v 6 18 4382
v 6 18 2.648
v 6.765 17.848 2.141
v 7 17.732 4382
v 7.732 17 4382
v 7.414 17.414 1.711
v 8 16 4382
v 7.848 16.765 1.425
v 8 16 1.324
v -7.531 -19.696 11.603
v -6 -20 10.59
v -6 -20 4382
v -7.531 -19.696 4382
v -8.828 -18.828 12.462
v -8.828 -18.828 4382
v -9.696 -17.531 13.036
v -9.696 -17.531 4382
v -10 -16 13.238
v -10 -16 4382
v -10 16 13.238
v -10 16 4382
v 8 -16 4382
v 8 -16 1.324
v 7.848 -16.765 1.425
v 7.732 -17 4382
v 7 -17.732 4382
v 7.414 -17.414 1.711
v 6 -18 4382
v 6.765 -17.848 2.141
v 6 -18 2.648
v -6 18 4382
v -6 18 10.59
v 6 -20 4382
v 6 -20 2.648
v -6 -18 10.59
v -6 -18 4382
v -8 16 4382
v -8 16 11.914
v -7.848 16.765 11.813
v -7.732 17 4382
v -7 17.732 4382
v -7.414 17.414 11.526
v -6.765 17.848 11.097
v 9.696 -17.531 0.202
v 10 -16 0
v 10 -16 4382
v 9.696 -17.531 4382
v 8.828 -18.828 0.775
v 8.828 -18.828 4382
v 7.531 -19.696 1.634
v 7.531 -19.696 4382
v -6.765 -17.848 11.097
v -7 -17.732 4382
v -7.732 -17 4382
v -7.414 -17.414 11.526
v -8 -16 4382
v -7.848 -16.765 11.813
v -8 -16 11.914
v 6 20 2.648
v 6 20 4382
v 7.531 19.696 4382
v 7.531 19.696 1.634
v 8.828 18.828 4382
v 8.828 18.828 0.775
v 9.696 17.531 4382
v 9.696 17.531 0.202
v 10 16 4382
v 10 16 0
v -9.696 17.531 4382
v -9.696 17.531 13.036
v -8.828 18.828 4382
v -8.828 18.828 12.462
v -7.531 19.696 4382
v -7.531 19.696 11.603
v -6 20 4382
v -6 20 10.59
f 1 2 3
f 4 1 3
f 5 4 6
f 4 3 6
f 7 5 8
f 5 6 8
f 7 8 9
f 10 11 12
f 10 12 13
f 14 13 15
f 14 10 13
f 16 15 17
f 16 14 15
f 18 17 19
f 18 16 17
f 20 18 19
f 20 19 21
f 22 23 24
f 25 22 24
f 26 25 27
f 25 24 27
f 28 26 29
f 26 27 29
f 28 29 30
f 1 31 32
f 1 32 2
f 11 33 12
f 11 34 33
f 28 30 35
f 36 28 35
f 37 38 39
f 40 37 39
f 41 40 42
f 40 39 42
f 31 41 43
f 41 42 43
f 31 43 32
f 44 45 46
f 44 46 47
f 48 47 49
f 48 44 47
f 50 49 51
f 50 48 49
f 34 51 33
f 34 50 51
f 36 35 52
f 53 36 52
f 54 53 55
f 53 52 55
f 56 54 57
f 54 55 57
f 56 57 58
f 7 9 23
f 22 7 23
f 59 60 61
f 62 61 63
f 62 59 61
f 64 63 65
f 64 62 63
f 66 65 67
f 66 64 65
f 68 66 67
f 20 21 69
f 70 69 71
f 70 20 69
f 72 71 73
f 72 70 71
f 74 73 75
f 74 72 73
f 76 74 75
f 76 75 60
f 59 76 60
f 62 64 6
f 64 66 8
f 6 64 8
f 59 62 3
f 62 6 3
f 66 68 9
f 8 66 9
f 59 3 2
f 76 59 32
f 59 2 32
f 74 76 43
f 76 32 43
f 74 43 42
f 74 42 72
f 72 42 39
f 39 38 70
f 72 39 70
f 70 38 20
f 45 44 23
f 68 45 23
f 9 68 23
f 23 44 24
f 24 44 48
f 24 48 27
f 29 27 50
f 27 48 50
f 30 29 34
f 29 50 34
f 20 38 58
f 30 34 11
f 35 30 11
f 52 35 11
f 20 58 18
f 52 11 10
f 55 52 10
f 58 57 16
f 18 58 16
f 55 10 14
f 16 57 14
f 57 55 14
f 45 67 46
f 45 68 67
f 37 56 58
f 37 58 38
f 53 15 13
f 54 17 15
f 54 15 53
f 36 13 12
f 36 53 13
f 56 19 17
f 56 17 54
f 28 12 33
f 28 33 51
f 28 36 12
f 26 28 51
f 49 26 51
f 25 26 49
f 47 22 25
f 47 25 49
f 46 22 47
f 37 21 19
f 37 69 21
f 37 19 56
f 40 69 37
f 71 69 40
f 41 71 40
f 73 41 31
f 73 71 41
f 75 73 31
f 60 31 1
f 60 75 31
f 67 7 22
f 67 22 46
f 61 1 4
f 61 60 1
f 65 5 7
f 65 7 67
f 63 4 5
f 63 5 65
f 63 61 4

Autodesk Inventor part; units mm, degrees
ref_plane "YZ Plane" through (0, 0, 0) normal (1, 0, 0) x (0, 1, 0)
ref_plane "Start plane" through (0, 0, 0) normal (0, 0, 1) x (1, 0, 0)
ref_plane "End plane" through (0, 0, 4382) normal (0, 0, 1) x (1, 0, 0)
sketch "Sketch" plane through (0, 0, 0) normal (0, 0, 1) x (1, 0, 0)
  line L0 (-10, -16) -> (-10, 16)
  line L1 (-6, 20) -> (6, 20)
  line L2 (10, 16) -> (10, -16)
  line L3 (6, -20) -> (-6, -20)
  arc A0 (-10, -16) -> (-6, -20) centre (-6, -16) ccw
  arc A1 (10, 16) -> (6, 20) centre (6, 16) ccw
  arc A2 (-6, 20) -> (-10, 16) centre (-6, 16) ccw
  arc A3 (6, -20) -> (10, -16) centre (6, -16) ccw
  arc A4 (-6, 18) -> (-8, 16) centre (-6, 16) ccw
  line L4 (-6, 18) -> (6, 18)
  arc A5 (8, 16) -> (6, 18) centre (6, 16) ccw
  line L5 (8, 16) -> (8, -16)
  arc A6 (6, -18) -> (8, -16) centre (6, -16) ccw
  line L6 (6, -18) -> (-6, -18)
  arc A7 (-8, -16) -> (-6, -18) centre (-6, -16) ccw
  line L7 (-8, -16) -> (-8, 16)
  line L8 (0, 29.1598) -> (0, -29.1598) construction
  line L9 (-15.1598, 0) -> (15.1598, 0) construction
  dimension "d7" = 4
  dimension "d9" = 20
  dimension "d11" = 40
  dimension "d12" = 2
  dimension "d15" = 10
  dimension "d16" = 20
extrude "Body" add sketch "Sketch" along normal up to surface (4382 mm away) from surface at 0
sketch "Sketch3" plane through (0, 0, 0) normal (0, 0, 1) x (1, 0, 0)
  line L0 (0, 0) -> (10, 0)
ref_plane "Work Plane3" through (0, 0, 0) normal (0, -1, 0) x (1, 0, 0)
sketch "Sketch5" plane through (-6, -20, 0) normal (0, -1, 0) x (1, 0, 0)
  line L0 (16, 0) -> (16, 4382) projected
  line L1 (12, 0) -> (16, 0) projected
  line L2 (12, 0) -> (0, 0) projected
  line L3 (-4, 0) -> (0, 0) projected
  line L4 (-4, 0) -> (-4, 4382) projected
  line L5 (16, 0) -> (-4, 13.2377)
  line L6 (-4, 0) -> (-4, 4382) projected
  point P0 (6, 0)
  dimension "d19" = 33.5
extrude "Extrusion2" cut sketch "Sketch5" against normal through all
sketch "Sketch4" plane through (0, 0, 0) normal (0, -1, 0) x (1, 0, 0)
  line L0 (-2, 0) -> (12, 0) projected
  line L1 (-2, 4382) -> (12, 4382) projected
  dimension "d18" = 4382
equation "\"d7\" = G_IR"
equation "\"d9\" = G_W"
equation "\"d11\" = G_H"
equation "\"d12\" = G_T"
equation "\"d15\" = 0.5 * d9"
equation "\"d16\" = 0.5 * d11"
equation "\"d3\" = G_L"
equation "\"G_W\" = 20"
equation "\"G_H\" = 40"
equation "\"G_T\" = 2"
equation "\"G_IR\" = 4"
equation "\"G_L\" = d18"
equation "\"G_OFFSET_START\" = 0"
equation "\"G_OFFSET_END\" = 0"
equation "\"d14\" = G_OFFSET_END + B_L"
equation "\"B_L\" = 4382"
properties part number "ISO 4019 - 40x20x2 - 4382" material "Steel, Mild"
